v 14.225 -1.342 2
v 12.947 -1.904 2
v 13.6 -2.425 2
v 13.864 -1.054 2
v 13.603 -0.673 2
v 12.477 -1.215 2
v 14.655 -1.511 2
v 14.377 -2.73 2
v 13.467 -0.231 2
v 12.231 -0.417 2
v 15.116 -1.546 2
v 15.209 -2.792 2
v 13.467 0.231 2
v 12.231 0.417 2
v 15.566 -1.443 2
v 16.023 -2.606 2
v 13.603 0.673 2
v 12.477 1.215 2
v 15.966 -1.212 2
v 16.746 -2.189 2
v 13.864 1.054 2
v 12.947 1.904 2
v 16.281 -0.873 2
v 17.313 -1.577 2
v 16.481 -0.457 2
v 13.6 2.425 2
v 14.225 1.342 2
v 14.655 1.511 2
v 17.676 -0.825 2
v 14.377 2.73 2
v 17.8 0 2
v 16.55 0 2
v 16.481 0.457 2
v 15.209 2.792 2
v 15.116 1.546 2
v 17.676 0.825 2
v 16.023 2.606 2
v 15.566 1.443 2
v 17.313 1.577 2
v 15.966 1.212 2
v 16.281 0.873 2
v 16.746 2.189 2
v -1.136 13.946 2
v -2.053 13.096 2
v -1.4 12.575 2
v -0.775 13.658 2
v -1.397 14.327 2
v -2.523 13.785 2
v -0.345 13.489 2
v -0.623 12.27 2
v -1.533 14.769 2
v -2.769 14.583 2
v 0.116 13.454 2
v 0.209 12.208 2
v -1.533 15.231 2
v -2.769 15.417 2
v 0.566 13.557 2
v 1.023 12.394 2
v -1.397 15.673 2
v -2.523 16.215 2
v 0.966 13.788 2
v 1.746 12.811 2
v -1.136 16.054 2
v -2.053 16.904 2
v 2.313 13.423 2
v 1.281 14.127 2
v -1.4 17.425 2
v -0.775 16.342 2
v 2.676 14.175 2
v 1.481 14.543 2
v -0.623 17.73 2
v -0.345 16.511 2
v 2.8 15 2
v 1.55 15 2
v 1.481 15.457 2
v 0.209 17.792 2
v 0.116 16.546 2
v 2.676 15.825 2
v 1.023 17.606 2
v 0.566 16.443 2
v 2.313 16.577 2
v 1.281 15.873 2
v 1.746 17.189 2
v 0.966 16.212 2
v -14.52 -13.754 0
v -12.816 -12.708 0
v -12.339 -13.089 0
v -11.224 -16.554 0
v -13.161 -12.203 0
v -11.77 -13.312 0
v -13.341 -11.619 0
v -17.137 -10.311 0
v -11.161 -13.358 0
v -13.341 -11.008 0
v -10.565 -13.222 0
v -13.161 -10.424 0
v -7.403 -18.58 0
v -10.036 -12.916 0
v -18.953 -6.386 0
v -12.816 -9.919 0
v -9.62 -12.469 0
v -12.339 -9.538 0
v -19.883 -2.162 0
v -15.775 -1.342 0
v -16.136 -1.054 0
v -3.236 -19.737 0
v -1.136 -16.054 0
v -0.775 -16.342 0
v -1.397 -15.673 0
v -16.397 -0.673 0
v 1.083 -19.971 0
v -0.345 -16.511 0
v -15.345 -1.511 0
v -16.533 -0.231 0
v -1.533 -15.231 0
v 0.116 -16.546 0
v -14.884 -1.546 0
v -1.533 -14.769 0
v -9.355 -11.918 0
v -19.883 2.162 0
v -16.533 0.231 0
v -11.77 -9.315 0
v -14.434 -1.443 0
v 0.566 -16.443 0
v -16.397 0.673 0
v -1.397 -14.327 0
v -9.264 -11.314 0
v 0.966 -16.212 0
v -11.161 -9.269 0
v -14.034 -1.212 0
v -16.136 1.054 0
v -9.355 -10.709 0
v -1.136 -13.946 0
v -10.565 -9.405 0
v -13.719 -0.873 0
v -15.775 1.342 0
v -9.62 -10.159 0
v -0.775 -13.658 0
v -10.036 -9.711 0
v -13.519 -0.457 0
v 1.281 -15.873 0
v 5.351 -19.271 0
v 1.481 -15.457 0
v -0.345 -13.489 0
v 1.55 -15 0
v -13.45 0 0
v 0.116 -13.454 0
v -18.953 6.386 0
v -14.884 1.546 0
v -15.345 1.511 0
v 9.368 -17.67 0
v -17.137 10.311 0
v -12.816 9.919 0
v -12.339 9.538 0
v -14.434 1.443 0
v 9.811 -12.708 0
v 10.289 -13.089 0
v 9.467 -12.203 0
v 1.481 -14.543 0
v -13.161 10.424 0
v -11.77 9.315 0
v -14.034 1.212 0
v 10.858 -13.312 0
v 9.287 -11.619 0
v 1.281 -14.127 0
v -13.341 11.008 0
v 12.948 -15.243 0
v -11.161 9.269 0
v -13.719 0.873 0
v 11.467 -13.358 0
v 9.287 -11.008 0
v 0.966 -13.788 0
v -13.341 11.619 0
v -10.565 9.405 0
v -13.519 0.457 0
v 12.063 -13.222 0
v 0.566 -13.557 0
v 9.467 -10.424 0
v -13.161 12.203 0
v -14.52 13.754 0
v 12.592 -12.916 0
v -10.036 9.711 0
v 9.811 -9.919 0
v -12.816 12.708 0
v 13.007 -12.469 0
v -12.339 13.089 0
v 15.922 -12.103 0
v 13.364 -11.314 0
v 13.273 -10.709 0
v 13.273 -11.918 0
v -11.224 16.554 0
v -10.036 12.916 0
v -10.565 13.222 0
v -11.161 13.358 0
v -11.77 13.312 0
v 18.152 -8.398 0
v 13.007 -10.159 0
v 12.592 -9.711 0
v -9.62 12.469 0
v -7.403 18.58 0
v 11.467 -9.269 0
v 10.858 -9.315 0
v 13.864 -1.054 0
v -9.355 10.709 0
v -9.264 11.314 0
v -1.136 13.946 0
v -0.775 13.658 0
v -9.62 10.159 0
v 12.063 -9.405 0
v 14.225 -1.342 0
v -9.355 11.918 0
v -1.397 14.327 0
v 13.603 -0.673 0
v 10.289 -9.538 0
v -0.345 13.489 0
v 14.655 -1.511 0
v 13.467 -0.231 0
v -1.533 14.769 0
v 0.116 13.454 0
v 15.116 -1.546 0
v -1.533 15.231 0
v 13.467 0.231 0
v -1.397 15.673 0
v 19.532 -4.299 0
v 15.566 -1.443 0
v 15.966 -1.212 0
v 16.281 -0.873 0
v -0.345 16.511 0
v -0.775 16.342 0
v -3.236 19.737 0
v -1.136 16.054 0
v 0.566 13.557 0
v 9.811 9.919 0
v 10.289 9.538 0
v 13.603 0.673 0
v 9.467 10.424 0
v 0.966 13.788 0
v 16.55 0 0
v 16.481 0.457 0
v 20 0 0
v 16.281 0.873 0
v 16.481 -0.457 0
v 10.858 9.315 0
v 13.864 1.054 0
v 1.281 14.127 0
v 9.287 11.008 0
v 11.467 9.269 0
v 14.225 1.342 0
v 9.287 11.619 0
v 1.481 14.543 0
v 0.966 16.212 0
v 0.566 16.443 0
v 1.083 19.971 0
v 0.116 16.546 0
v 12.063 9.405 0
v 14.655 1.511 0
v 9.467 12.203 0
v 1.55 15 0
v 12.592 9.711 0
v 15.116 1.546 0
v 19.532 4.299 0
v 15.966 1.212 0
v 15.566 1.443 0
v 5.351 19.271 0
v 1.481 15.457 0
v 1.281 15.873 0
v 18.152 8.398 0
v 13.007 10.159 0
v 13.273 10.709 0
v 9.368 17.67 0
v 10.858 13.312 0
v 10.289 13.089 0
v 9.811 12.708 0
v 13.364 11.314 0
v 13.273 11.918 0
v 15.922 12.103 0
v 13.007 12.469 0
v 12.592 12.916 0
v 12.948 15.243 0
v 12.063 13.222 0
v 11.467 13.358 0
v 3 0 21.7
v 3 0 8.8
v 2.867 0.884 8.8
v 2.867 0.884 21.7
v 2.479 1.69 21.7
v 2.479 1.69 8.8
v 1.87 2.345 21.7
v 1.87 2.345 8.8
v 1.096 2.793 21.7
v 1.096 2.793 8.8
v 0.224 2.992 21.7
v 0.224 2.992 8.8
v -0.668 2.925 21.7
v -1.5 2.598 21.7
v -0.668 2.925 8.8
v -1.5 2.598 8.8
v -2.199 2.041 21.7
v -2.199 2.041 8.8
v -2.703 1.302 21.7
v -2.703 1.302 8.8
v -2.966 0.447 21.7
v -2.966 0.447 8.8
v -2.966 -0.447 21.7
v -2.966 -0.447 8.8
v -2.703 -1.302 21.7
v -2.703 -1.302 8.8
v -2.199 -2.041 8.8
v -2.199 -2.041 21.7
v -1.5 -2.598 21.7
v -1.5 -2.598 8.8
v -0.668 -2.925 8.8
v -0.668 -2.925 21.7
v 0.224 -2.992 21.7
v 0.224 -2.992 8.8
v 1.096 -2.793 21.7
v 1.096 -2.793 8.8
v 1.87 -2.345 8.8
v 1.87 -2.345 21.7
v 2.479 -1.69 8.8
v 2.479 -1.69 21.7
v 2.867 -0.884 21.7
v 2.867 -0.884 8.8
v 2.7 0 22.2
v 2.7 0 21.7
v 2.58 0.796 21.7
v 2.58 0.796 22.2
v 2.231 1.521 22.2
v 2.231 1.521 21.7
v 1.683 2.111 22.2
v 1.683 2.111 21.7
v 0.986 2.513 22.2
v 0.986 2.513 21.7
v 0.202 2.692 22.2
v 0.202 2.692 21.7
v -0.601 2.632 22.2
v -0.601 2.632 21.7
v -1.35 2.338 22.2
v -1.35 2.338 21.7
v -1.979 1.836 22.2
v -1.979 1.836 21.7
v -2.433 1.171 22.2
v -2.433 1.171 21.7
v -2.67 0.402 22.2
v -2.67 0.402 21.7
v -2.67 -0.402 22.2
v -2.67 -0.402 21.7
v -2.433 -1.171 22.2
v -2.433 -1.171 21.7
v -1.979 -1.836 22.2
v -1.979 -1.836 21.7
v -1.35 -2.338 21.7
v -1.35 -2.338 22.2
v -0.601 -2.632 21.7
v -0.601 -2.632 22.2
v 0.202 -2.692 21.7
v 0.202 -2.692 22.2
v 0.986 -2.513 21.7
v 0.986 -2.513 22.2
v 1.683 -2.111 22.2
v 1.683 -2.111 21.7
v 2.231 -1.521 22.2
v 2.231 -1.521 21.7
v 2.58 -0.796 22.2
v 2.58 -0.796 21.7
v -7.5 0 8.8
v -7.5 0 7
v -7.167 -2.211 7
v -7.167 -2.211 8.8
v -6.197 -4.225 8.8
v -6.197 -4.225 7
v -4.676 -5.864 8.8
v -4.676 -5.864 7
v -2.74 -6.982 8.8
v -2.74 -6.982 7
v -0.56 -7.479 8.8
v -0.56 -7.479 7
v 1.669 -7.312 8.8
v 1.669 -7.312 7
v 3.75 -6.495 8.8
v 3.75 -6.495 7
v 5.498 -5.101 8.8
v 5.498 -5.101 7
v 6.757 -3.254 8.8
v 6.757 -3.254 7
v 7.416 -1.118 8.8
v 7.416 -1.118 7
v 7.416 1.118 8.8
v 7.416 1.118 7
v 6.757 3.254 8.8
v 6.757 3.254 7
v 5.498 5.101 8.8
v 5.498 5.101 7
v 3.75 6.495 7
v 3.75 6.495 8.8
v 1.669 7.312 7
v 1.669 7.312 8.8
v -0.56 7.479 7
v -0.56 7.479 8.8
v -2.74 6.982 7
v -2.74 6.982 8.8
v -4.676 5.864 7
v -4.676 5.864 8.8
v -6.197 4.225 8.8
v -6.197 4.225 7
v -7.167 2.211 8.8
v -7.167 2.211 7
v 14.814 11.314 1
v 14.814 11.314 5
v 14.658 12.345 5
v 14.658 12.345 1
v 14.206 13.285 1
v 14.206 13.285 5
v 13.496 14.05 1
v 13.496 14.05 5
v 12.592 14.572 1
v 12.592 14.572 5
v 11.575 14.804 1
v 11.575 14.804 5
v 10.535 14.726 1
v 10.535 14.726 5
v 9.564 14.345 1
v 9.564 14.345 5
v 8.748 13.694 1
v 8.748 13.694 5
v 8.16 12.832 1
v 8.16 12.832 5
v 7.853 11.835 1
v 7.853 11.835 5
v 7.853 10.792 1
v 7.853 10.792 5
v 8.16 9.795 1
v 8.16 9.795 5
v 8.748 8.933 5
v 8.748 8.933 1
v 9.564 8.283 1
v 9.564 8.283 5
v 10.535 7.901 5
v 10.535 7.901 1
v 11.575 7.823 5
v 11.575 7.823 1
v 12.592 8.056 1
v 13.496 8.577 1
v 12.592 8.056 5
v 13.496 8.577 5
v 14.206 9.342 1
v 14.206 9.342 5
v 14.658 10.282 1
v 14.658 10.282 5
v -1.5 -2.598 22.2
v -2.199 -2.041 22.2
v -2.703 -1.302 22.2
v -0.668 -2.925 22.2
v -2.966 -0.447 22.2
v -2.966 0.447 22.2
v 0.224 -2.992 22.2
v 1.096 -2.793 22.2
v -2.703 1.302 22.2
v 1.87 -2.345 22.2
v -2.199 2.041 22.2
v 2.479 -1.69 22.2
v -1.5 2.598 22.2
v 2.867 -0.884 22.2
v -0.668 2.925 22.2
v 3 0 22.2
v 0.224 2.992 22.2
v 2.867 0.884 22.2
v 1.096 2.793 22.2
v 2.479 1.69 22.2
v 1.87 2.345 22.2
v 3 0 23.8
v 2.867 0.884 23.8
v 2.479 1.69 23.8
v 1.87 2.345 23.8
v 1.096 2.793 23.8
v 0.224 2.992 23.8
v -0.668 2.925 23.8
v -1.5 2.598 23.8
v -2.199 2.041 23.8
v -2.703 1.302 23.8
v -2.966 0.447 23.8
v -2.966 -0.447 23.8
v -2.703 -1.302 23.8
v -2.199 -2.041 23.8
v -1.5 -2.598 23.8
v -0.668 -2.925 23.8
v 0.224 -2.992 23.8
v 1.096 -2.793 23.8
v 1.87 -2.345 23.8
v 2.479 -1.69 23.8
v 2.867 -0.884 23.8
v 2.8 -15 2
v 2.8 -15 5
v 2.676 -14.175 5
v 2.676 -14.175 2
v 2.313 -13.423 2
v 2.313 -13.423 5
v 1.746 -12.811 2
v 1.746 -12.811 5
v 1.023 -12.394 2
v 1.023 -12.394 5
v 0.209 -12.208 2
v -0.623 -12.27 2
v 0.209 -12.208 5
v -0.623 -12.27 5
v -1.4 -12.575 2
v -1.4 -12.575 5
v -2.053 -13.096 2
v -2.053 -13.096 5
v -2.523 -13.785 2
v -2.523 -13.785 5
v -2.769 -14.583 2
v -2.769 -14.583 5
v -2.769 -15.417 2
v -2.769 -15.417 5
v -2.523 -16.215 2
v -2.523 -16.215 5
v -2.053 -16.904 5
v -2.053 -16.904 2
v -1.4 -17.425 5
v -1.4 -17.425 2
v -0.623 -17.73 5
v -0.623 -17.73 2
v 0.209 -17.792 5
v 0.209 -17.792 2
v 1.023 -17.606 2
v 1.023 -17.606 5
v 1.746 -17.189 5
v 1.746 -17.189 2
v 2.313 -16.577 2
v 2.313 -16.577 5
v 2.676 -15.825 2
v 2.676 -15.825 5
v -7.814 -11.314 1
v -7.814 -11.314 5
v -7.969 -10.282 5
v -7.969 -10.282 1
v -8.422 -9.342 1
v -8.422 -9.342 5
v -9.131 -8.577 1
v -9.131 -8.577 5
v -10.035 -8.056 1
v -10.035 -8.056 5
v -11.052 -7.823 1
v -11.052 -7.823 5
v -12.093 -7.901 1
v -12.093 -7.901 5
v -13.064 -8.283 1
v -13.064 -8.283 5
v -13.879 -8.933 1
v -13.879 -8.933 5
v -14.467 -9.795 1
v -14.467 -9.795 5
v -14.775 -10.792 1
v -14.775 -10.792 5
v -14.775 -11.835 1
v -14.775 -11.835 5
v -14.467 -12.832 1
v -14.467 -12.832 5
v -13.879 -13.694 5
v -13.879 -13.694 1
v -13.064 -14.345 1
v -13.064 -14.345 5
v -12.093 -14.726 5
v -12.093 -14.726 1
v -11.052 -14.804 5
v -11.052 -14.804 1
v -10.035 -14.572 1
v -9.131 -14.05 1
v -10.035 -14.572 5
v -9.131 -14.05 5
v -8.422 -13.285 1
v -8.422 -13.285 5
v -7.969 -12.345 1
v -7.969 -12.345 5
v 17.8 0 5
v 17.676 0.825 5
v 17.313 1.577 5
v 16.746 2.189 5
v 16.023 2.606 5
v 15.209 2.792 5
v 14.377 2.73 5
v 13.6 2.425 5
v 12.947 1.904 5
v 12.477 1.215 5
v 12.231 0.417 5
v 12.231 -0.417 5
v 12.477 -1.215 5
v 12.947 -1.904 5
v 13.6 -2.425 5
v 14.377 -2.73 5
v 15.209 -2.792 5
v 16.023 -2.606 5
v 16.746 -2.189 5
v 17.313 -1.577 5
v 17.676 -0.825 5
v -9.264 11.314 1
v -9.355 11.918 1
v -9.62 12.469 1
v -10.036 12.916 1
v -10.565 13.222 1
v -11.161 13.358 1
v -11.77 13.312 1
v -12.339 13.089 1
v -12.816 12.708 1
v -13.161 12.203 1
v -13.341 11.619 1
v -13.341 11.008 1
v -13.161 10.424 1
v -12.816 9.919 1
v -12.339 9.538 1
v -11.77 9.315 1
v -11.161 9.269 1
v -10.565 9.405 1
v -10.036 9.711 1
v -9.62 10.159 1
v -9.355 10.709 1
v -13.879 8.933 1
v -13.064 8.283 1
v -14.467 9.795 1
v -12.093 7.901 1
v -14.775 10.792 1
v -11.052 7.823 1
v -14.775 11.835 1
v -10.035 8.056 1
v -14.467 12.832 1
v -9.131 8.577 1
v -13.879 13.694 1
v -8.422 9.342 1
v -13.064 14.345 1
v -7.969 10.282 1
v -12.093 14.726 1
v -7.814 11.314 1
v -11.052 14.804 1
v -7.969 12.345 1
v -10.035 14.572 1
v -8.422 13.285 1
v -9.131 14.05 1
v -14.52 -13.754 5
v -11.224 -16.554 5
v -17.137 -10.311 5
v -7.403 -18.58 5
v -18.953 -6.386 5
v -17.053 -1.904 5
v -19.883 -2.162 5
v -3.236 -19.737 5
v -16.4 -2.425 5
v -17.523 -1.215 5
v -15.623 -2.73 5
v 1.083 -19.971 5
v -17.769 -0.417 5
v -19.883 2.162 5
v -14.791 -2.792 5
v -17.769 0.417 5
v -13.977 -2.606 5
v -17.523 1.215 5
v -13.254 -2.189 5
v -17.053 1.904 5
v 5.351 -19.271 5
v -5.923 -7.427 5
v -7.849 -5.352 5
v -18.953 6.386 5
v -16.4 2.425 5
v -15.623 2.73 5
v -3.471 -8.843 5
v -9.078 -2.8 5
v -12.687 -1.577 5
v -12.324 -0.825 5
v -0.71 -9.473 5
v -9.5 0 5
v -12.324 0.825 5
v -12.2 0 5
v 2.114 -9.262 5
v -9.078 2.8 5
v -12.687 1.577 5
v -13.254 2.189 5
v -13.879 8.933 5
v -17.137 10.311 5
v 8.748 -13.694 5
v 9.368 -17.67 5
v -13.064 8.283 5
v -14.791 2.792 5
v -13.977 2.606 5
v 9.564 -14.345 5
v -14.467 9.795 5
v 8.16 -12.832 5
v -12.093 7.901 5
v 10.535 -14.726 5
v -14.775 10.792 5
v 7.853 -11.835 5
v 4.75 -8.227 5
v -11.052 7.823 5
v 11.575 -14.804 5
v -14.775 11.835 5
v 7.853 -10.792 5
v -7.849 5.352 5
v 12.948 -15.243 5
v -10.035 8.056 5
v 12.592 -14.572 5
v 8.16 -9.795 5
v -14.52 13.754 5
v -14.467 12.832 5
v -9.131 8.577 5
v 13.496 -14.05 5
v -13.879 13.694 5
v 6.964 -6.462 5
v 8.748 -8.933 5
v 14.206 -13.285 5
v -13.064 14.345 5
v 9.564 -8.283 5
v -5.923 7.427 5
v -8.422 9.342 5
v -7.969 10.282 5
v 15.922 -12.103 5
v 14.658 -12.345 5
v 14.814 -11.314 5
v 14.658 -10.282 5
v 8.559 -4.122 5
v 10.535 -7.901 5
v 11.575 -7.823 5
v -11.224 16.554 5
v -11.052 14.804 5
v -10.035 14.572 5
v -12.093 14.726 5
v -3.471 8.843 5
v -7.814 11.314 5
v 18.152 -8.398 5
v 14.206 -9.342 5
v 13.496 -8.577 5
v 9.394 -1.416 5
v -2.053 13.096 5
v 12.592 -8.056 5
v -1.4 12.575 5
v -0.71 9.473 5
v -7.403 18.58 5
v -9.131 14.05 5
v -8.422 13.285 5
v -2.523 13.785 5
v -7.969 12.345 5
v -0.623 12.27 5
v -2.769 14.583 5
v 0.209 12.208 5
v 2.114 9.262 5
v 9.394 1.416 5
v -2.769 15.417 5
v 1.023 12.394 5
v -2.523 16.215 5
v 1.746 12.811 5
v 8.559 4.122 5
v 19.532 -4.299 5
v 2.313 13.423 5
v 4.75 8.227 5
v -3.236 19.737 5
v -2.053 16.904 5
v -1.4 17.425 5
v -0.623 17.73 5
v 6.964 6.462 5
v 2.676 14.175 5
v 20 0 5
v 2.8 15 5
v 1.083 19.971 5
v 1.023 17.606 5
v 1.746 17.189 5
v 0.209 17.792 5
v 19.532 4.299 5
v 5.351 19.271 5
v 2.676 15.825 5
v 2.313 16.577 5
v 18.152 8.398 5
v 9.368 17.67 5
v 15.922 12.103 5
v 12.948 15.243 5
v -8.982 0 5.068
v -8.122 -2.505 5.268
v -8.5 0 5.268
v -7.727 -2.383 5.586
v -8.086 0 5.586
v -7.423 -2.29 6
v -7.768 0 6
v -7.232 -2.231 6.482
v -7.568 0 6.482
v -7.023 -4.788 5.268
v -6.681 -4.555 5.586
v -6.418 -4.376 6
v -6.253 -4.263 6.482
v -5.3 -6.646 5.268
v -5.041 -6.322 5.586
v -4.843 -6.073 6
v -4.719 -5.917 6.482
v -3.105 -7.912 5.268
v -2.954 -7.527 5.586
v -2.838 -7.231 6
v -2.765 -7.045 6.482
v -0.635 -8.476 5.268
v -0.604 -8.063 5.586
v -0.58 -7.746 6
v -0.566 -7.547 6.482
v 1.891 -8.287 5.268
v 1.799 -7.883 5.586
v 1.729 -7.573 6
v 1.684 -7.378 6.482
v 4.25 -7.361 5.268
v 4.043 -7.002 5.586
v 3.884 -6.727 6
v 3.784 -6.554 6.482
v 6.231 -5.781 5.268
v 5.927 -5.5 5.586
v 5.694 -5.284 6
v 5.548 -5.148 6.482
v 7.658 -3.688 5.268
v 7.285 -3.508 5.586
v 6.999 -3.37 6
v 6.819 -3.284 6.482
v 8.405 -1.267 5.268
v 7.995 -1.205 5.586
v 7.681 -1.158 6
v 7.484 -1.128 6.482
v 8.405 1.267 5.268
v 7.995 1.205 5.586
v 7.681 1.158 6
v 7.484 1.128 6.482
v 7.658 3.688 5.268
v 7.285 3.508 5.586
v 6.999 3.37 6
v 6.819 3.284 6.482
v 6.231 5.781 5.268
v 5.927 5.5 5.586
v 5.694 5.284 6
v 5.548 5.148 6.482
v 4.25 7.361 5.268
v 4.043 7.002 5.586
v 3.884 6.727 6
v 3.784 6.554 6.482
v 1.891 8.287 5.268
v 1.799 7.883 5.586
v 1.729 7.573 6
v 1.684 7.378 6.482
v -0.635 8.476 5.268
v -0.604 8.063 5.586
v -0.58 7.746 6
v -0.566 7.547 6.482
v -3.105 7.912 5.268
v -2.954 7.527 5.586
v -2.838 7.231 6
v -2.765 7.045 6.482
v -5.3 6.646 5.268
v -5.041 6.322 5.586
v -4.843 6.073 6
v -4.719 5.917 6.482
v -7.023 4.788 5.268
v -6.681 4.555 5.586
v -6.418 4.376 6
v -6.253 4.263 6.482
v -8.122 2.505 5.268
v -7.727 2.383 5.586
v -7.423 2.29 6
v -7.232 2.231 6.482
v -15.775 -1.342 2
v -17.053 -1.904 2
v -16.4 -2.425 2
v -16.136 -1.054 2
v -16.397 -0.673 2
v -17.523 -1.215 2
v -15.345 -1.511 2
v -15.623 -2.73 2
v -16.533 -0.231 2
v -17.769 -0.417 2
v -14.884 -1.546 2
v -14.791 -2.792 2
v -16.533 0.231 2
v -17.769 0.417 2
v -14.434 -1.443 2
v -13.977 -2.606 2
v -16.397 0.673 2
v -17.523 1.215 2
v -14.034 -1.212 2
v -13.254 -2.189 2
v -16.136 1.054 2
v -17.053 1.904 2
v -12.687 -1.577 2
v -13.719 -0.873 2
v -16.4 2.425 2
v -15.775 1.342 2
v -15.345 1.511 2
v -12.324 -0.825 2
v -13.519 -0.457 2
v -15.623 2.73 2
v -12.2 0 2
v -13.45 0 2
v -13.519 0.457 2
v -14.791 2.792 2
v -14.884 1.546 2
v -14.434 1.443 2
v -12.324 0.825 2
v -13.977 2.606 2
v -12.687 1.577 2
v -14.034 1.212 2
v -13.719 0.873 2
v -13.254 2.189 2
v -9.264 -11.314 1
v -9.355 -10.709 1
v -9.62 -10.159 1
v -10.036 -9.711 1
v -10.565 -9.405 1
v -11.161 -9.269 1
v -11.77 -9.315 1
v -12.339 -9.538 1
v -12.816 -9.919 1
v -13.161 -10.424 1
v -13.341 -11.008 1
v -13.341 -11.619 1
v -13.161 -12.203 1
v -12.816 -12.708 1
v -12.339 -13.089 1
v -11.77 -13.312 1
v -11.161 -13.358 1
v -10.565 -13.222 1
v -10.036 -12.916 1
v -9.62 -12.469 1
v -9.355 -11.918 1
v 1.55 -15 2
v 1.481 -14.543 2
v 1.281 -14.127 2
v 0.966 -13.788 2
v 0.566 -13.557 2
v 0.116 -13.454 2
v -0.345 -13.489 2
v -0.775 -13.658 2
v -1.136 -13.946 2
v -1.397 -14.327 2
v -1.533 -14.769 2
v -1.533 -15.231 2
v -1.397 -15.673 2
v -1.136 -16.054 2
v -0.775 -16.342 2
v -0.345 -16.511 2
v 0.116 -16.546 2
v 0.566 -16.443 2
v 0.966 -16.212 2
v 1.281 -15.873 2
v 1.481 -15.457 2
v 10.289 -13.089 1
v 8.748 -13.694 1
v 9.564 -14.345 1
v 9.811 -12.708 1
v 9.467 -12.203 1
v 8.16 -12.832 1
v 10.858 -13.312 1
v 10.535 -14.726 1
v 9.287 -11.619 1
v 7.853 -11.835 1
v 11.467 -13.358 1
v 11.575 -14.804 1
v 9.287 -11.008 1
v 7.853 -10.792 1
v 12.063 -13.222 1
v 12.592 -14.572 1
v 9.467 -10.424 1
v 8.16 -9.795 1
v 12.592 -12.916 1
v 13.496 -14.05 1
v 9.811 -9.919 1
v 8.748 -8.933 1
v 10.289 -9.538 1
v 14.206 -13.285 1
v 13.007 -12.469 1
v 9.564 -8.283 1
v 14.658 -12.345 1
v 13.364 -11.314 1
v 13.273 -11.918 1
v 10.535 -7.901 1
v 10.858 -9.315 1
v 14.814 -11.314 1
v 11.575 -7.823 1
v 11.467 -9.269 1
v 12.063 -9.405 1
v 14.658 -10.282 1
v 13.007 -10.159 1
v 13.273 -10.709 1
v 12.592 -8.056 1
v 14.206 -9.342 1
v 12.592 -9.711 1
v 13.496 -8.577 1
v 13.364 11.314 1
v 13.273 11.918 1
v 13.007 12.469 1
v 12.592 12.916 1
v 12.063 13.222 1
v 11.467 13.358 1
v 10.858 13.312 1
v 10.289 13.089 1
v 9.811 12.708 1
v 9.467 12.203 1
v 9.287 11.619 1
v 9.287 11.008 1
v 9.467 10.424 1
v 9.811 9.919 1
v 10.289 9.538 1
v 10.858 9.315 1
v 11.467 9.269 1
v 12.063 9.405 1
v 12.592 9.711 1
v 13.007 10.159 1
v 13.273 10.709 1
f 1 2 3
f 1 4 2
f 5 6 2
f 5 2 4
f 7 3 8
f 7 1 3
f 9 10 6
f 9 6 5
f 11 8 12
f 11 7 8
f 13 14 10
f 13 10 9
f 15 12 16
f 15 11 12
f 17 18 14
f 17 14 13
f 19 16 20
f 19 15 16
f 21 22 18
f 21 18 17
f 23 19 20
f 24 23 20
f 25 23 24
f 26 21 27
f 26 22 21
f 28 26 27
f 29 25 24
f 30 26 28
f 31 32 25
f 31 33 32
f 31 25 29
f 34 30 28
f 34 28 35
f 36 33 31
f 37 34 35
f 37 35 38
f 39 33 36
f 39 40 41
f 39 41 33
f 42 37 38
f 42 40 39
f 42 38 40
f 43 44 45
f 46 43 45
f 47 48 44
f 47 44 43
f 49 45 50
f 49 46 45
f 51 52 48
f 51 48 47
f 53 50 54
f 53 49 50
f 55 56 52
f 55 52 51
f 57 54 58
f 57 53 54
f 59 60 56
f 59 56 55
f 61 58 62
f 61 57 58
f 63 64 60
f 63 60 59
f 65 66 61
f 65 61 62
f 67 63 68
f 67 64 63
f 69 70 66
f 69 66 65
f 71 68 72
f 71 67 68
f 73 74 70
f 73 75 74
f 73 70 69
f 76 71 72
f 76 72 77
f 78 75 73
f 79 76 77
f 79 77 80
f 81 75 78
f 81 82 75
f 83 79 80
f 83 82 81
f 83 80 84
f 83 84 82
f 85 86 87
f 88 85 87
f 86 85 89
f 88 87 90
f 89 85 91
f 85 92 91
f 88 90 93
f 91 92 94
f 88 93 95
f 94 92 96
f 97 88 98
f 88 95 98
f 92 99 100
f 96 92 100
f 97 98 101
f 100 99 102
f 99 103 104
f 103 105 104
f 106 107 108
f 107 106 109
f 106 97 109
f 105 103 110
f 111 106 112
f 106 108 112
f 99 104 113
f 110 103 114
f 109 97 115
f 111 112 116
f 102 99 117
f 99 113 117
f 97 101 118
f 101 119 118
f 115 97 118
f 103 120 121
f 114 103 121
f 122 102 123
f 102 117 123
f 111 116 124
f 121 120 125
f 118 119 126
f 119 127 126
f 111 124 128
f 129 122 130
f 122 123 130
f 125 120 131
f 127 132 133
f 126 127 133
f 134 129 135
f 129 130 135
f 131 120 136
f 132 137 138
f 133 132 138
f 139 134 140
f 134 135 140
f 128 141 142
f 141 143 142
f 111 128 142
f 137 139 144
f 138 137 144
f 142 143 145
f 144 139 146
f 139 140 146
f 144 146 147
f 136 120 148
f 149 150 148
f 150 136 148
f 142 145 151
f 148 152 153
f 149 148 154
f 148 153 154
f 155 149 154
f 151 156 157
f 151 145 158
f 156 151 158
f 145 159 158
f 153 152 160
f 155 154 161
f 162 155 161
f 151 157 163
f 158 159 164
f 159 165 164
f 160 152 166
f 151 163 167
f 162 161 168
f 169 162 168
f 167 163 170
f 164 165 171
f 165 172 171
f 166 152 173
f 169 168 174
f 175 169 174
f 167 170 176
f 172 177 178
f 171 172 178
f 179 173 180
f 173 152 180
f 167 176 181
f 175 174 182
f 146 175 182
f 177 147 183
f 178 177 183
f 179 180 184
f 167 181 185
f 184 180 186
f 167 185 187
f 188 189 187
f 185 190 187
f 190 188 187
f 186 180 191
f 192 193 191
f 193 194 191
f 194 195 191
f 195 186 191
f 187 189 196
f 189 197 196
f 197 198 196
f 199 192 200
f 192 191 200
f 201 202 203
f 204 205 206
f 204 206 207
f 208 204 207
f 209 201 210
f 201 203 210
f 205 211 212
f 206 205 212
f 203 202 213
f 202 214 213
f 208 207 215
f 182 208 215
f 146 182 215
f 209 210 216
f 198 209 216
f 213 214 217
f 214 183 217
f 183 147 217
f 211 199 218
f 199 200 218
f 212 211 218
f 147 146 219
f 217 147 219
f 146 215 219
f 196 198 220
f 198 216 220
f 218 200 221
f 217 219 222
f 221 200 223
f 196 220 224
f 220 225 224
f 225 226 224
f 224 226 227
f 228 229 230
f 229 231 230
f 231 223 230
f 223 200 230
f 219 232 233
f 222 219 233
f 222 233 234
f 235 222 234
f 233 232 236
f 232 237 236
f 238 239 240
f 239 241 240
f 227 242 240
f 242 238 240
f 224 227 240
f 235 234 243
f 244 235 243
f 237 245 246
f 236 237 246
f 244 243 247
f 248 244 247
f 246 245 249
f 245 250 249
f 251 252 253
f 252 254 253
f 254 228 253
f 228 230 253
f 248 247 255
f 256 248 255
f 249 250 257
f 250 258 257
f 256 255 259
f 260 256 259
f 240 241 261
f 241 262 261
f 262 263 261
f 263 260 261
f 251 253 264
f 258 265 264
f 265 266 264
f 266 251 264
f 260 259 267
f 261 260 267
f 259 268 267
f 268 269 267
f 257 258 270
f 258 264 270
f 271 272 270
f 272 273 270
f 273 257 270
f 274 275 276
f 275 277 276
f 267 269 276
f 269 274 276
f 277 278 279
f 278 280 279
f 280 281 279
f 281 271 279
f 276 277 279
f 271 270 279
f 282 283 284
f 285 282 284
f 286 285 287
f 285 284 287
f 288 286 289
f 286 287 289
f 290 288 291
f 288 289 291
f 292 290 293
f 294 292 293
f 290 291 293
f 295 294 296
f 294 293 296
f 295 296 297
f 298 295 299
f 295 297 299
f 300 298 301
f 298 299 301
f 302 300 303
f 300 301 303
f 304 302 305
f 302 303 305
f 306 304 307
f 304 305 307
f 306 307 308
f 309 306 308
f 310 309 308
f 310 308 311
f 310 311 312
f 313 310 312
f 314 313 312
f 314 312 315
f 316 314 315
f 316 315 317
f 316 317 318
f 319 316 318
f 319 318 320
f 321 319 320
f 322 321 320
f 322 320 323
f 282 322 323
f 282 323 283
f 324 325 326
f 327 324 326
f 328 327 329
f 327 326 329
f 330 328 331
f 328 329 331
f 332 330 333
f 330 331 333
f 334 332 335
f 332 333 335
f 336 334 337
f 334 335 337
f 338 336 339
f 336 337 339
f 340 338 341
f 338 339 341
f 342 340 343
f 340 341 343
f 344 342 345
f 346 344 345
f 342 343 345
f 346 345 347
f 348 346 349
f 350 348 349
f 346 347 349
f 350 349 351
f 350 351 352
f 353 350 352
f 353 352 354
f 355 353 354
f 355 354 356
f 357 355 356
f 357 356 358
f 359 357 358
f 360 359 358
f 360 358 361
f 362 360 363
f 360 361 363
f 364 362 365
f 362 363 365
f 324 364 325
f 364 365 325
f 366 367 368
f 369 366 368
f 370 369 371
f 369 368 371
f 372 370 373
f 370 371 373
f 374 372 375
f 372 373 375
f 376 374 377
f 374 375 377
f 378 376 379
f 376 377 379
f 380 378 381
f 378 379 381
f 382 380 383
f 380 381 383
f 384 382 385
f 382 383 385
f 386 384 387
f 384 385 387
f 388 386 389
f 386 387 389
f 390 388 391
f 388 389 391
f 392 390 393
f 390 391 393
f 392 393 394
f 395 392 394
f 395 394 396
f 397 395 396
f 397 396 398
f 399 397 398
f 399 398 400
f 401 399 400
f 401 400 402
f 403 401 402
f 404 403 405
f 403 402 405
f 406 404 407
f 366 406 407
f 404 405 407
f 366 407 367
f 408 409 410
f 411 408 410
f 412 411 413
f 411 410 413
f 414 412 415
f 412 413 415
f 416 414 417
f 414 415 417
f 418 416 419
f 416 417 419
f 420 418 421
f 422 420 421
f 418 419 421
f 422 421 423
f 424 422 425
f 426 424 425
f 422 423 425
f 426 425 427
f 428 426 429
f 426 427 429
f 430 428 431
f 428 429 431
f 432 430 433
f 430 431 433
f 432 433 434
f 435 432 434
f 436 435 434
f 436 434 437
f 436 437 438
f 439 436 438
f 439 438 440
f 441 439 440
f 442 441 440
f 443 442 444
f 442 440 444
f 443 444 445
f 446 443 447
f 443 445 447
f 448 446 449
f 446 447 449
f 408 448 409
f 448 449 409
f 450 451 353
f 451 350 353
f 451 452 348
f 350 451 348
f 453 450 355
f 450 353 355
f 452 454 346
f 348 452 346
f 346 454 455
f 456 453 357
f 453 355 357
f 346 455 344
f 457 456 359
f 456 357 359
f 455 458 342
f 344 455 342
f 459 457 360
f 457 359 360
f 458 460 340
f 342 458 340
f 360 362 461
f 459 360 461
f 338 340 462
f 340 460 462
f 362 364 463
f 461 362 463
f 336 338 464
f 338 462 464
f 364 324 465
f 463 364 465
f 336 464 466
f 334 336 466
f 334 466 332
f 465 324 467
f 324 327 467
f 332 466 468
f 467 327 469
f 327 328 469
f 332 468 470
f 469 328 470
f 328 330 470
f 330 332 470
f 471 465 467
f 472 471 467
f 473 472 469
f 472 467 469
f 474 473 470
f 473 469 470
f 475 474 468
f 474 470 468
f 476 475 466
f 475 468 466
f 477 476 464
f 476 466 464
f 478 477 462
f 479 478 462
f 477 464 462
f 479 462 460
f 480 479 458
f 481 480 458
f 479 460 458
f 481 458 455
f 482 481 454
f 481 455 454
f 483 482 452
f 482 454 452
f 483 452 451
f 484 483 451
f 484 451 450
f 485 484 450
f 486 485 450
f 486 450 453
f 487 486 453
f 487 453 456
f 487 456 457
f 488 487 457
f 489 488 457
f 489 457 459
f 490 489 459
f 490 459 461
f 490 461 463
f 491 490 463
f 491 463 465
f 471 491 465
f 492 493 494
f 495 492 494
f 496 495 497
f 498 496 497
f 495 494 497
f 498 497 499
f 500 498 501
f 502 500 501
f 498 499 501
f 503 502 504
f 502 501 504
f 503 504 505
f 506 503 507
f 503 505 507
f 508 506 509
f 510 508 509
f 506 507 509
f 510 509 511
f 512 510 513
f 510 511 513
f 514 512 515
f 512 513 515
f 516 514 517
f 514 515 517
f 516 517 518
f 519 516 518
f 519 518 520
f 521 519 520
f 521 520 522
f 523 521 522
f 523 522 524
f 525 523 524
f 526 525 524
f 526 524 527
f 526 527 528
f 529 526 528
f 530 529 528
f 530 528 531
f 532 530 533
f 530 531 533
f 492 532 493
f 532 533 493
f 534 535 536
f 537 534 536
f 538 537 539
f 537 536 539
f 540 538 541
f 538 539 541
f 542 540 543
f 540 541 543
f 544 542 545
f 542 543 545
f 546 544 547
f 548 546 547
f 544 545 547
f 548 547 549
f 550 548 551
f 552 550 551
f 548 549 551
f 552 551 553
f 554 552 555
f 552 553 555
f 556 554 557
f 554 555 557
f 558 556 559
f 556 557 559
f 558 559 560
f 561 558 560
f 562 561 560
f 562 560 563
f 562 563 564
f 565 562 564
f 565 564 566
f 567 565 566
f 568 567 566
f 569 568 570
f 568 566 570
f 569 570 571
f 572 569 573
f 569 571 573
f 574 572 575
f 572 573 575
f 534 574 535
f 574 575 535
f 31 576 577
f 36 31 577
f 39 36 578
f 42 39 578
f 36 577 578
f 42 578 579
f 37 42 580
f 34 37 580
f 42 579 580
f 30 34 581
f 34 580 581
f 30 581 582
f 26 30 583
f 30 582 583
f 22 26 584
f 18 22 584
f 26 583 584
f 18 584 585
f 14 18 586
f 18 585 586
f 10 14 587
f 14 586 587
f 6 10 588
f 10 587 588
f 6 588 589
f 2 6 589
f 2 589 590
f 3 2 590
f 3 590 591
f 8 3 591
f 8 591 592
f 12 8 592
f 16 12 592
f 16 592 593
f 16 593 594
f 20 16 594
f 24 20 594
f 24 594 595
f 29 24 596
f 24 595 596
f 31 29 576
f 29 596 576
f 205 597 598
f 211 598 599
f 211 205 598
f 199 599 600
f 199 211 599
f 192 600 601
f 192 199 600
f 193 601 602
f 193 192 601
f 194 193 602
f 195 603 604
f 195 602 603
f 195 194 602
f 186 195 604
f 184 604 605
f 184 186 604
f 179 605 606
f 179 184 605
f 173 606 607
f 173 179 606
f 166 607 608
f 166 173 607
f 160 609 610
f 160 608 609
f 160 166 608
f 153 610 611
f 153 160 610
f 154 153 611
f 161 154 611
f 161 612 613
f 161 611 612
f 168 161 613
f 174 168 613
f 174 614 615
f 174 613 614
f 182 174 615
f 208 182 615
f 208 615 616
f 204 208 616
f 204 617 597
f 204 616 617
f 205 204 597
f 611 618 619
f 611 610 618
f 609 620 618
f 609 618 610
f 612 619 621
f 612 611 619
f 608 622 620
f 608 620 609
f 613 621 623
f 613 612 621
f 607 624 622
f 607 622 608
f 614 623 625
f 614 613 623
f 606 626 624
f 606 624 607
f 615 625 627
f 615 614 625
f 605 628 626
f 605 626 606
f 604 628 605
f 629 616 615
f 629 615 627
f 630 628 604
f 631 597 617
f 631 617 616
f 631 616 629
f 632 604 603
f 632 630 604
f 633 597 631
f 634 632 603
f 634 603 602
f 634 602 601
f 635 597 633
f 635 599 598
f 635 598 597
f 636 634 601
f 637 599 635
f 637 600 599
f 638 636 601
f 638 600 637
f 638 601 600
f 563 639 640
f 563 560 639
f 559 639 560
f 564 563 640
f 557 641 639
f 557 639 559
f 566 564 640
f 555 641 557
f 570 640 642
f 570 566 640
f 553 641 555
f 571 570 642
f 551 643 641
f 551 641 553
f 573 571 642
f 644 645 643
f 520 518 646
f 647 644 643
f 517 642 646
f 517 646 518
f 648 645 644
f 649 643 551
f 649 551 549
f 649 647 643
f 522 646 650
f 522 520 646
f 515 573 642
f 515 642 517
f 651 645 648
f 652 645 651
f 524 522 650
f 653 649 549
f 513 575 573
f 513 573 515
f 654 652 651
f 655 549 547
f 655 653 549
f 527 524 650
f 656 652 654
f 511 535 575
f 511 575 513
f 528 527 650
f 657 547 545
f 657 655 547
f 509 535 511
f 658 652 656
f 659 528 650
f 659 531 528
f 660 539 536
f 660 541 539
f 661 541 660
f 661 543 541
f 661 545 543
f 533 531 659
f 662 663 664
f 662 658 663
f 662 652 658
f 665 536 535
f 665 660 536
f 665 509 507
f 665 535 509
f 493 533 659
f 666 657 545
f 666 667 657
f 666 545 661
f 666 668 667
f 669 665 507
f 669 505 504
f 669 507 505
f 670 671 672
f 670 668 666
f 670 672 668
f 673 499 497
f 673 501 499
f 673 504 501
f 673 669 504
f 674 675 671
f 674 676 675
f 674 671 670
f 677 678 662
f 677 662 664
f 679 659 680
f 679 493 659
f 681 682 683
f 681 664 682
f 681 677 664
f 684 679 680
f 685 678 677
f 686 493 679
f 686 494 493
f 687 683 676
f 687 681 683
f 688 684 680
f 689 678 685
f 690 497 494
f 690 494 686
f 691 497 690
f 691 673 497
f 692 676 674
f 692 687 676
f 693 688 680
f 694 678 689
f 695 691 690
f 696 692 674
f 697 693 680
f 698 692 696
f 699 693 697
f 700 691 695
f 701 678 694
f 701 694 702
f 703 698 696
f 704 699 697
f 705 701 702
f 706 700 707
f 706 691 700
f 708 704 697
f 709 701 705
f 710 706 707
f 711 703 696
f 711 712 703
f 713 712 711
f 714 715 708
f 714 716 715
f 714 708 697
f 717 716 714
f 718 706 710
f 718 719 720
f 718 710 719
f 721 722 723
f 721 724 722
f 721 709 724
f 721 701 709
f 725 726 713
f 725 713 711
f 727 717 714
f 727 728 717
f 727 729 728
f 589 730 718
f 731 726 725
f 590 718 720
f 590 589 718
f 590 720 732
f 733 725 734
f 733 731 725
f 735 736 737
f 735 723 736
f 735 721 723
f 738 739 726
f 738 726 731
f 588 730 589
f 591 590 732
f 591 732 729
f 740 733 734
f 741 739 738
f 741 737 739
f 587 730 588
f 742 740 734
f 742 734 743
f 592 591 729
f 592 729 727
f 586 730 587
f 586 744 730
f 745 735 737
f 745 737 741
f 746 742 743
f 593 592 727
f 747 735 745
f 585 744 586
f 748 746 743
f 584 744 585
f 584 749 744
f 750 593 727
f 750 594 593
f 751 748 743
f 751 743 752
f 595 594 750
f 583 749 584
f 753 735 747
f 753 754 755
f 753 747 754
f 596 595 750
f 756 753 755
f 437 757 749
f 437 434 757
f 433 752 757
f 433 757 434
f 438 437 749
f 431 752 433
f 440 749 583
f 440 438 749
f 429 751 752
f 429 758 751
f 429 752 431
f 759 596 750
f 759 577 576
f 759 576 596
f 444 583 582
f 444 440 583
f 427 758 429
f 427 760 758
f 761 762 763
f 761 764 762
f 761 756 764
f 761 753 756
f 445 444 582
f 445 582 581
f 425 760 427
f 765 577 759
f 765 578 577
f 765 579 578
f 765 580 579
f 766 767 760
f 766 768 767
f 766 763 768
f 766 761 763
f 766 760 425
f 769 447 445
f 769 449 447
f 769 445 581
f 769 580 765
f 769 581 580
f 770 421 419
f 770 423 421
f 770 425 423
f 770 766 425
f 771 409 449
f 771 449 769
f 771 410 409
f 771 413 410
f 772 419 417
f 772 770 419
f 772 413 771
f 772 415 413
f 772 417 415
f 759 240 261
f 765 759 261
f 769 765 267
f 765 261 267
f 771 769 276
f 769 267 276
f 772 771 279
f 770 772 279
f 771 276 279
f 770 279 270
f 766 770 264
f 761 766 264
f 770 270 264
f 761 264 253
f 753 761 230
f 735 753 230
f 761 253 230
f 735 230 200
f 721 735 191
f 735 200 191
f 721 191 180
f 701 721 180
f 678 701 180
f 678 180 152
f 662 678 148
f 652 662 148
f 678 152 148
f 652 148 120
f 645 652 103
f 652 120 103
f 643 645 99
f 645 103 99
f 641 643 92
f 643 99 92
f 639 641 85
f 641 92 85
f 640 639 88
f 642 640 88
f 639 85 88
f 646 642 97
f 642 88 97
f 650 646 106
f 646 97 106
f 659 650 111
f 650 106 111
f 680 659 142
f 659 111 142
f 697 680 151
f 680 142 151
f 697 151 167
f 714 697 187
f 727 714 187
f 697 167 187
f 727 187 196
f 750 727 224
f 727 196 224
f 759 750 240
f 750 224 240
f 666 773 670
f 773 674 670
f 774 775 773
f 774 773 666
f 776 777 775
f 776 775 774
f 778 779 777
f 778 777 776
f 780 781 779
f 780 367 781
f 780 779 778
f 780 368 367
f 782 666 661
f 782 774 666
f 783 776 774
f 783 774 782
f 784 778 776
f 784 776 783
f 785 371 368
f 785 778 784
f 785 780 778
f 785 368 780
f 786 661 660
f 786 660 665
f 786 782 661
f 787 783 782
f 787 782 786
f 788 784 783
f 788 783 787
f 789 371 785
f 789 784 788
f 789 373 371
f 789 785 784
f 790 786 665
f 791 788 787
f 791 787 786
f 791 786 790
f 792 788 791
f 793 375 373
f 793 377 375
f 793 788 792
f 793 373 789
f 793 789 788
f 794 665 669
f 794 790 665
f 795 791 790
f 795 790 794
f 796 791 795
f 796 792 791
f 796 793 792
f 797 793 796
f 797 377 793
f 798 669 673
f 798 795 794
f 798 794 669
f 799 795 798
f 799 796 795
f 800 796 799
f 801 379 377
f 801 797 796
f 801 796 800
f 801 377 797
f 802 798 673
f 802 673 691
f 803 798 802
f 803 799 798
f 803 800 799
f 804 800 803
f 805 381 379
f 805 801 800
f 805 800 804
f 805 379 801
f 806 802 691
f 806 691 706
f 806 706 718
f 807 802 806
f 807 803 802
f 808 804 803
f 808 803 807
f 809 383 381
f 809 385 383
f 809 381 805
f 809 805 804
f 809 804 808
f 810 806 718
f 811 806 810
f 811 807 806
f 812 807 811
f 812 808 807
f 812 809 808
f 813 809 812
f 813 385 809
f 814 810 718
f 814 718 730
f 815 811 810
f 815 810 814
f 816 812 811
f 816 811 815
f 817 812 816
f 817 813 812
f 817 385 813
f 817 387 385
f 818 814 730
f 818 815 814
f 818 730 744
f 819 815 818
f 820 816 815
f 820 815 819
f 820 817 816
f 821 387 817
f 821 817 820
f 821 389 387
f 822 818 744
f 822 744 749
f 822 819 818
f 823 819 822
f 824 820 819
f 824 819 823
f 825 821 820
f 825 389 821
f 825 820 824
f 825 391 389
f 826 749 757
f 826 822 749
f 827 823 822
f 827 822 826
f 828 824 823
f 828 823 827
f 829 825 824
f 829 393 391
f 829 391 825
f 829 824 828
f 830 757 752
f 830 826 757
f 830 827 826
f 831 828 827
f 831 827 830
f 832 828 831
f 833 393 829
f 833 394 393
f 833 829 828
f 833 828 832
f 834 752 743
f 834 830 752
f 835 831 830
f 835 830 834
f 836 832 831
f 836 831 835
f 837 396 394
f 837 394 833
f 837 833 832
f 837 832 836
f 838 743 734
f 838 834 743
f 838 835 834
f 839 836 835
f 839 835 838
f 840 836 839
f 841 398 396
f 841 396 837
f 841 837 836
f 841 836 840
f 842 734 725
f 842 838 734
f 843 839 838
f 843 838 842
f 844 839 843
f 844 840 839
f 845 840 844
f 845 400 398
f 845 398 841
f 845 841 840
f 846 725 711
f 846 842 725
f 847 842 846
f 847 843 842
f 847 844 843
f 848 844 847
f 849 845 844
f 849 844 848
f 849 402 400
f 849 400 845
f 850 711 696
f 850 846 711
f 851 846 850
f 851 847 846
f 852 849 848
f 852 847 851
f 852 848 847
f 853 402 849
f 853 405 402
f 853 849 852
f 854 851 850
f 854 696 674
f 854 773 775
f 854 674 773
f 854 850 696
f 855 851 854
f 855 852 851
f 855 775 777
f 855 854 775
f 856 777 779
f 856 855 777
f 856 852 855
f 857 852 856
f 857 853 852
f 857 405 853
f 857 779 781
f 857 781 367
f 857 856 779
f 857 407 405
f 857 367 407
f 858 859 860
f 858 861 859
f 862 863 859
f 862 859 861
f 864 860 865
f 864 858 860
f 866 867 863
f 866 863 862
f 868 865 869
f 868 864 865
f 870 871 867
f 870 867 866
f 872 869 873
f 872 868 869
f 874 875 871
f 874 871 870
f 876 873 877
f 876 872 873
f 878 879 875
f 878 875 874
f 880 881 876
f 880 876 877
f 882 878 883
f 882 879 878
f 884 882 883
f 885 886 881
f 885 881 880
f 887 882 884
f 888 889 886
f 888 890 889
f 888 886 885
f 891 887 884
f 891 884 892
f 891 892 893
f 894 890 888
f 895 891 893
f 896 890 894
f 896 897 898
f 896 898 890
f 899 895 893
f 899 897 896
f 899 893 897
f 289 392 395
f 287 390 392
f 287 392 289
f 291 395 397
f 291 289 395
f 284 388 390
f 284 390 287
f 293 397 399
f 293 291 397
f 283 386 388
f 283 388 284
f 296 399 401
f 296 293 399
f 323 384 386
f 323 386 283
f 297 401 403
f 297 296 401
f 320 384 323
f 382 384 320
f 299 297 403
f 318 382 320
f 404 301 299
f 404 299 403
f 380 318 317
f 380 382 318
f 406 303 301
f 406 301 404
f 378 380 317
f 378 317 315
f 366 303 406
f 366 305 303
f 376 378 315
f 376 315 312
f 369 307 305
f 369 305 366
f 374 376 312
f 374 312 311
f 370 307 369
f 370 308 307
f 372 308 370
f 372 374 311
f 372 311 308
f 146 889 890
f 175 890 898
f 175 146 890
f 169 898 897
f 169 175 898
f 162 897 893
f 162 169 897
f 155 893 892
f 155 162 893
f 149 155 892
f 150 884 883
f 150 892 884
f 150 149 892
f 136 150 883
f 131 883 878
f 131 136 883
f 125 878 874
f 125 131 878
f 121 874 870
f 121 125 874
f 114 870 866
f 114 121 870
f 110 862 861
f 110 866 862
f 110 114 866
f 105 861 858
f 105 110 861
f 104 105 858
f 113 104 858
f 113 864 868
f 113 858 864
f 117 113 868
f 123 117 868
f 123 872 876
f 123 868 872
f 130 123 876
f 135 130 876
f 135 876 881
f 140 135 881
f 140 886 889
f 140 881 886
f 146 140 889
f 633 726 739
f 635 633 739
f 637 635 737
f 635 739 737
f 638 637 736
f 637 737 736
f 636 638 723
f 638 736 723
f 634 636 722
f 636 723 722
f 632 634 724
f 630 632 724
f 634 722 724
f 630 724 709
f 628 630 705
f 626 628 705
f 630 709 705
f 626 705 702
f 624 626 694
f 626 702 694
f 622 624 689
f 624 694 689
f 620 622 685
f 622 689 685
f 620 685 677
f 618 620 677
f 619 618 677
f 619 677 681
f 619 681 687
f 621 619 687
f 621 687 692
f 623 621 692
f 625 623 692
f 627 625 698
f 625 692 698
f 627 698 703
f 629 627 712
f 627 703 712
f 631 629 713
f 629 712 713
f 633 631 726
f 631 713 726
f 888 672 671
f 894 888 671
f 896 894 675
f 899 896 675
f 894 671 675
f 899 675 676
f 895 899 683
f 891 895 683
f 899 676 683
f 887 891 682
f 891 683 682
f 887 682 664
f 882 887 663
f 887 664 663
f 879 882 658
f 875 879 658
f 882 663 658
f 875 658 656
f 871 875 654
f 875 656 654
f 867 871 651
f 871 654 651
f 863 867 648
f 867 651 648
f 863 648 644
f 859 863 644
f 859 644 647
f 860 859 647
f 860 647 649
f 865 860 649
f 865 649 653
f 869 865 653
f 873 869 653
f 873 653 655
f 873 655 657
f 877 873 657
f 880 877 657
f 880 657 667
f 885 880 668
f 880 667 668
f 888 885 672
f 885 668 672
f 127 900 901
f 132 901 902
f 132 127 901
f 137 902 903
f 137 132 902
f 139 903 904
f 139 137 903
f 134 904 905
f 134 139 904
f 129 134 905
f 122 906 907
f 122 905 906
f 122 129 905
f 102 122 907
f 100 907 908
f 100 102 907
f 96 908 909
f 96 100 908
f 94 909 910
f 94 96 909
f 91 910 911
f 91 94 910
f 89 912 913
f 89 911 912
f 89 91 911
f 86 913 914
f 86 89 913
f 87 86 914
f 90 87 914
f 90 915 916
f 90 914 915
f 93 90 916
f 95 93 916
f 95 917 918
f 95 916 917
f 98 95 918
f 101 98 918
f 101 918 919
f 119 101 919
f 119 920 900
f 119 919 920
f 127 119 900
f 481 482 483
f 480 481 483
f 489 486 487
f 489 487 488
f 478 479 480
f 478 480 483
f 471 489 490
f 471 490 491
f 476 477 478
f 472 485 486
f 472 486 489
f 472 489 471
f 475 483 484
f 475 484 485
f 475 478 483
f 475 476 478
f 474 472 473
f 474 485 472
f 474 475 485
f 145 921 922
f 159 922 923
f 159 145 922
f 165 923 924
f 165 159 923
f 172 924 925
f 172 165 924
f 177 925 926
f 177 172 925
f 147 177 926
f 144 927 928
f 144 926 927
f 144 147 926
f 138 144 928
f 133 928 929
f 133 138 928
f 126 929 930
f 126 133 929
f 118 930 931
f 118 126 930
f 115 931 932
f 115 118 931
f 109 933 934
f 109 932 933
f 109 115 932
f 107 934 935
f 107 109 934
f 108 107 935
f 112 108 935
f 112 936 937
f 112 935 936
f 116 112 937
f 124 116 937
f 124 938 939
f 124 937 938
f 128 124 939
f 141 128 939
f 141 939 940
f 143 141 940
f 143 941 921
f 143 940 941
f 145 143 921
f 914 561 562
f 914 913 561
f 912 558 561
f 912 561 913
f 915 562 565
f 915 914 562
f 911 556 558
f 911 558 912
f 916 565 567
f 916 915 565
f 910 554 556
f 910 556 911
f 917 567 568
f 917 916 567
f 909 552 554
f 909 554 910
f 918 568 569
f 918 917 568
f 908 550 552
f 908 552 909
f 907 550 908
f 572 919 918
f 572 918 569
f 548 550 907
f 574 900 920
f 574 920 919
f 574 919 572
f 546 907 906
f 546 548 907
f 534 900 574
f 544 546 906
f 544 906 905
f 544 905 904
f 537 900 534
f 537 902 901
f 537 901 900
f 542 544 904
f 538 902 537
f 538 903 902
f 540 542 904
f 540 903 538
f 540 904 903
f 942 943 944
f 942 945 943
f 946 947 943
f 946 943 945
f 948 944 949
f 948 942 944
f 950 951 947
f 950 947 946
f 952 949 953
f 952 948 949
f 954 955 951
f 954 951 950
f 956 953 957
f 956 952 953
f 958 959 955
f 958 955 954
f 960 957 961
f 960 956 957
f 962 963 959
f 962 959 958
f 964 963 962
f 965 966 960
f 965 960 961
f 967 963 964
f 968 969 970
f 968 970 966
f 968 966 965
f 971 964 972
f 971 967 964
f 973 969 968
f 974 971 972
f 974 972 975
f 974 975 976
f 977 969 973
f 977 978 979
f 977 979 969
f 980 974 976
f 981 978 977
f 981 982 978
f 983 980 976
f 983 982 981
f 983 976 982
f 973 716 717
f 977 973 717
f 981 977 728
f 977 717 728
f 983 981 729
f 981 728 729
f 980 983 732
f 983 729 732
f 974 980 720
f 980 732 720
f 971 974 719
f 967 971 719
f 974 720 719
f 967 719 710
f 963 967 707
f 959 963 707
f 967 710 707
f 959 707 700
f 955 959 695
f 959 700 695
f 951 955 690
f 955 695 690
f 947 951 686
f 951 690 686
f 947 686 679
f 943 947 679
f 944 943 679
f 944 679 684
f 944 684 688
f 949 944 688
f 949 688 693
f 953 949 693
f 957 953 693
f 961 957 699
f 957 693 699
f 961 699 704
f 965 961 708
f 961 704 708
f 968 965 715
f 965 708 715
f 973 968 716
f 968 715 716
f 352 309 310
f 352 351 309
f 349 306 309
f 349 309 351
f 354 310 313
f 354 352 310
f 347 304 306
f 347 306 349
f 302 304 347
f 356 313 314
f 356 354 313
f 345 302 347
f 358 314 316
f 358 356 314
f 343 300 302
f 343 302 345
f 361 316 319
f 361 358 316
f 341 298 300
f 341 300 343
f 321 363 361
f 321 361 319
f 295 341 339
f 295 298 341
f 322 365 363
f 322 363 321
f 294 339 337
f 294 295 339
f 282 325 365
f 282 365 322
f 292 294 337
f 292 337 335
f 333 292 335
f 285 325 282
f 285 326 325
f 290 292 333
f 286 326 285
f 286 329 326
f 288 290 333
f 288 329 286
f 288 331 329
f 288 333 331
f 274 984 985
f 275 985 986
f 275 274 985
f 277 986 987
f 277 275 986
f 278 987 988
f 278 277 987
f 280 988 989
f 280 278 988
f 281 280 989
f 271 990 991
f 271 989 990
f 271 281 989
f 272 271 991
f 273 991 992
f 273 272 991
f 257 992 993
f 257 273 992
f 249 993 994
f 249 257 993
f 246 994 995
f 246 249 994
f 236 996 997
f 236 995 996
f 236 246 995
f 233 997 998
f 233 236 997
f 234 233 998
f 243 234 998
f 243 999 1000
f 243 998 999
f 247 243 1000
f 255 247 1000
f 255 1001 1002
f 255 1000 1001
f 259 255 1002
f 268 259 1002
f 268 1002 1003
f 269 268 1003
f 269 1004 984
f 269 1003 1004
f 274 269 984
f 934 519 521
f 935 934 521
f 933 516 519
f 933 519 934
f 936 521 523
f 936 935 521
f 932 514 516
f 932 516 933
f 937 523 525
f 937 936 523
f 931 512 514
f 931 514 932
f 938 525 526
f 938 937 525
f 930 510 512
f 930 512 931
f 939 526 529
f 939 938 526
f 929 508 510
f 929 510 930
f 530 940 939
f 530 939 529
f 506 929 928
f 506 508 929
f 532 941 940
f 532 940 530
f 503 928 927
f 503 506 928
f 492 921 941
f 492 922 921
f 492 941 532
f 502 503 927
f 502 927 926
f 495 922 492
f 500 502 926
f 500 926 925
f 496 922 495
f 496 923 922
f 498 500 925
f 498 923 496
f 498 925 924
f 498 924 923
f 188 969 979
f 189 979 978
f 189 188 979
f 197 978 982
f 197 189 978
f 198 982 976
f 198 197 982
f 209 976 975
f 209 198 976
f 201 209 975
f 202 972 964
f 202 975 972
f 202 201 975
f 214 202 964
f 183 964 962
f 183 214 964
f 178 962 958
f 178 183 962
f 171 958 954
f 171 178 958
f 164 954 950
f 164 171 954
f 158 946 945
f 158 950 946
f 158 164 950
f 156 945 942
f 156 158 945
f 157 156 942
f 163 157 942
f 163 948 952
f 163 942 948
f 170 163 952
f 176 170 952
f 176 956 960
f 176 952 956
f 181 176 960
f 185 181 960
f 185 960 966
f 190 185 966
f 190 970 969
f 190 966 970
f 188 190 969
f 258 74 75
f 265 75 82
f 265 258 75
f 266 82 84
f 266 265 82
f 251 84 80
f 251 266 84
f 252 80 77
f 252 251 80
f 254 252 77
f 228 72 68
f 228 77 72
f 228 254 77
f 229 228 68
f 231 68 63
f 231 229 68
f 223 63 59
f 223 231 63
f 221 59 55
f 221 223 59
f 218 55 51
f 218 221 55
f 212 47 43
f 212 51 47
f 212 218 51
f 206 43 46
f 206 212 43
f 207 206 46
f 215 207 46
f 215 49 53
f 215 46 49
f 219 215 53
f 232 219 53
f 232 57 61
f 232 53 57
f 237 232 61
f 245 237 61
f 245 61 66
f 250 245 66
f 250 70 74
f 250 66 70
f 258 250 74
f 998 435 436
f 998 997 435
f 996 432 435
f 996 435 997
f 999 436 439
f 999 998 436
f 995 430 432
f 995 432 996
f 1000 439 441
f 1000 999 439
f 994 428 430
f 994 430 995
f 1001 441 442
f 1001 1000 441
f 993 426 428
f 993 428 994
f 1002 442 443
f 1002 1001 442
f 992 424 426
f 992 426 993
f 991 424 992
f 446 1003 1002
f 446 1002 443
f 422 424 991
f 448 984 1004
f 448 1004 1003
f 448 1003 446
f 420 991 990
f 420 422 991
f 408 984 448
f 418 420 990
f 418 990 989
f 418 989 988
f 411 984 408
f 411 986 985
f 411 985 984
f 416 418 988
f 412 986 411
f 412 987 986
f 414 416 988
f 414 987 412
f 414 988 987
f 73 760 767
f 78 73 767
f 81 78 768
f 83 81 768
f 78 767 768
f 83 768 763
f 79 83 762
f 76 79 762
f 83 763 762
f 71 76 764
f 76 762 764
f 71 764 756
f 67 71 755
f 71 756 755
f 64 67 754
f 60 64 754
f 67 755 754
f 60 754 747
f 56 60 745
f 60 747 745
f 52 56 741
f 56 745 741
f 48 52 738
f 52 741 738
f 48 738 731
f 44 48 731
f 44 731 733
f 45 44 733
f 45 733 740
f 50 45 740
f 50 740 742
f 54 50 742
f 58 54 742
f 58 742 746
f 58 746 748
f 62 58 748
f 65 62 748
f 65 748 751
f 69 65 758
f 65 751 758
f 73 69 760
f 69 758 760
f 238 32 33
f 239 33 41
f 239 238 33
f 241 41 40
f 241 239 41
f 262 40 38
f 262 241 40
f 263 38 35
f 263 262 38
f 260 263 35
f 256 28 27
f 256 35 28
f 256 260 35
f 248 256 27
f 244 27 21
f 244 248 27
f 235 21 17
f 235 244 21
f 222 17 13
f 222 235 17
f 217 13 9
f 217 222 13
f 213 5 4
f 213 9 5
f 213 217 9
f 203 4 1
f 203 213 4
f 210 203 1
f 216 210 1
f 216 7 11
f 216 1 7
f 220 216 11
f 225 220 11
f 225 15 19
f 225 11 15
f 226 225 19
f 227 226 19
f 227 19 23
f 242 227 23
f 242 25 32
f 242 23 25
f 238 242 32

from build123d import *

# Parameters (mm, degrees)
SKETCH_1_R          = 20
SKETCH_1_R_2        = 1.55
SKETCH_1_R_3        = 2.05
EXTRUDE_1_DEPTH     = 5
SKETCH_2_R          = 2.8
CUT_EXTRUDE_1_DEPTH = 3
SKETCH_3_R          = 3.5
CUT_EXTRUDE_2_DEPTH = 4
SKETCH_5_R          = 7.5
EXTRUDE_3_DEPTH     = 3.8
SKETCH_6_R          = 3
EXTRUDE_4_DEPTH     = 15
FILLET_1_R          = 2
SKETCH_7_R          = 3
SKETCH_7_R_2        = 2.7
CUT_EXTRUDE_3_DEPTH = 0.5


with BuildPart() as part:
    # 草图1 → 凸台-拉伸1 (new body)
    with BuildSketch(Plane.XY):
        Circle(SKETCH_1_R)
        with Locations((0, 15)):
            Circle(SKETCH_1_R_2, mode=Mode.SUBTRACT)
        with Locations((-11.313708499, 11.313708499)):
            Circle(SKETCH_1_R_3, mode=Mode.SUBTRACT)
        with Locations((11.313708499, 11.313708499)):
            Circle(SKETCH_1_R_3, mode=Mode.SUBTRACT)
        with Locations((15, 0)):
            Circle(SKETCH_1_R_2, mode=Mode.SUBTRACT)
        with Locations((11.313708499, -11.313708499)):
            Circle(SKETCH_1_R_3, mode=Mode.SUBTRACT)
        with Locations((0, -15)):
            Circle(SKETCH_1_R_2, mode=Mode.SUBTRACT)
        with Locations((-11.313708499, -11.313708499)):
            Circle(SKETCH_1_R_3, mode=Mode.SUBTRACT)
        with Locations((-15, 0)):
            Circle(SKETCH_1_R_2, mode=Mode.SUBTRACT)
    extrude(amount=EXTRUDE_1_DEPTH)

    # 草图2 → 切除-拉伸1 (cut)
    with BuildSketch(Plane.XY.offset(5)):
        with Locations((0, 15)):
            Circle(SKETCH_2_R)
        with Locations((15, 0)):
            Circle(SKETCH_2_R)
        with Locations((0, -15)):
            Circle(SKETCH_2_R)
        with Locations((-15, 0)):
            Circle(SKETCH_2_R)
    extrude(amount=-CUT_EXTRUDE_1_DEPTH, mode=Mode.SUBTRACT)

    # 草图3 → 切除-拉伸2 (cut)
    with BuildSketch(Plane.XY.offset(5)):
        with Locations((-11.313708499, 11.313708499)):
            Circle(SKETCH_3_R)
        with Locations((11.313708499, 11.313708499)):
            Circle(SKETCH_3_R)
        with Locations((11.313708499, -11.313708499)):
            Circle(SKETCH_3_R)
        with Locations((-11.313708499, -11.313708499)):
            Circle(SKETCH_3_R)
    extrude(amount=-CUT_EXTRUDE_2_DEPTH, mode=Mode.SUBTRACT)

    # 草图5 → 凸台-拉伸3 (add)
    with BuildSketch(Plane.XY.offset(5)):
        with Locations(Location((0, 0, 0), (0, 0, 180))):
            Circle(SKETCH_5_R)
    extrude(amount=EXTRUDE_3_DEPTH)

    # 草图6 → 凸台-拉伸4 (add)
    with BuildSketch(Plane.XY.offset(8.8)):
        Circle(SKETCH_6_R)
    extrude(amount=EXTRUDE_4_DEPTH)

    # 圆角1
    fillet_1_edges = [part.edges().sort_by_distance(p)[0] for p in [
        (7.5, 0, 5),
    ]]
    fillet(fillet_1_edges, radius=FILLET_1_R)

    # 草图7 → 切除-拉伸3 (cut)
    with BuildSketch(Plane.XY.offset(21.7)):
        Circle(SKETCH_7_R)
        Circle(SKETCH_7_R_2, mode=Mode.SUBTRACT)
    extrude(amount=CUT_EXTRUDE_3_DEPTH, mode=Mode.SUBTRACT)


solid = part.part
